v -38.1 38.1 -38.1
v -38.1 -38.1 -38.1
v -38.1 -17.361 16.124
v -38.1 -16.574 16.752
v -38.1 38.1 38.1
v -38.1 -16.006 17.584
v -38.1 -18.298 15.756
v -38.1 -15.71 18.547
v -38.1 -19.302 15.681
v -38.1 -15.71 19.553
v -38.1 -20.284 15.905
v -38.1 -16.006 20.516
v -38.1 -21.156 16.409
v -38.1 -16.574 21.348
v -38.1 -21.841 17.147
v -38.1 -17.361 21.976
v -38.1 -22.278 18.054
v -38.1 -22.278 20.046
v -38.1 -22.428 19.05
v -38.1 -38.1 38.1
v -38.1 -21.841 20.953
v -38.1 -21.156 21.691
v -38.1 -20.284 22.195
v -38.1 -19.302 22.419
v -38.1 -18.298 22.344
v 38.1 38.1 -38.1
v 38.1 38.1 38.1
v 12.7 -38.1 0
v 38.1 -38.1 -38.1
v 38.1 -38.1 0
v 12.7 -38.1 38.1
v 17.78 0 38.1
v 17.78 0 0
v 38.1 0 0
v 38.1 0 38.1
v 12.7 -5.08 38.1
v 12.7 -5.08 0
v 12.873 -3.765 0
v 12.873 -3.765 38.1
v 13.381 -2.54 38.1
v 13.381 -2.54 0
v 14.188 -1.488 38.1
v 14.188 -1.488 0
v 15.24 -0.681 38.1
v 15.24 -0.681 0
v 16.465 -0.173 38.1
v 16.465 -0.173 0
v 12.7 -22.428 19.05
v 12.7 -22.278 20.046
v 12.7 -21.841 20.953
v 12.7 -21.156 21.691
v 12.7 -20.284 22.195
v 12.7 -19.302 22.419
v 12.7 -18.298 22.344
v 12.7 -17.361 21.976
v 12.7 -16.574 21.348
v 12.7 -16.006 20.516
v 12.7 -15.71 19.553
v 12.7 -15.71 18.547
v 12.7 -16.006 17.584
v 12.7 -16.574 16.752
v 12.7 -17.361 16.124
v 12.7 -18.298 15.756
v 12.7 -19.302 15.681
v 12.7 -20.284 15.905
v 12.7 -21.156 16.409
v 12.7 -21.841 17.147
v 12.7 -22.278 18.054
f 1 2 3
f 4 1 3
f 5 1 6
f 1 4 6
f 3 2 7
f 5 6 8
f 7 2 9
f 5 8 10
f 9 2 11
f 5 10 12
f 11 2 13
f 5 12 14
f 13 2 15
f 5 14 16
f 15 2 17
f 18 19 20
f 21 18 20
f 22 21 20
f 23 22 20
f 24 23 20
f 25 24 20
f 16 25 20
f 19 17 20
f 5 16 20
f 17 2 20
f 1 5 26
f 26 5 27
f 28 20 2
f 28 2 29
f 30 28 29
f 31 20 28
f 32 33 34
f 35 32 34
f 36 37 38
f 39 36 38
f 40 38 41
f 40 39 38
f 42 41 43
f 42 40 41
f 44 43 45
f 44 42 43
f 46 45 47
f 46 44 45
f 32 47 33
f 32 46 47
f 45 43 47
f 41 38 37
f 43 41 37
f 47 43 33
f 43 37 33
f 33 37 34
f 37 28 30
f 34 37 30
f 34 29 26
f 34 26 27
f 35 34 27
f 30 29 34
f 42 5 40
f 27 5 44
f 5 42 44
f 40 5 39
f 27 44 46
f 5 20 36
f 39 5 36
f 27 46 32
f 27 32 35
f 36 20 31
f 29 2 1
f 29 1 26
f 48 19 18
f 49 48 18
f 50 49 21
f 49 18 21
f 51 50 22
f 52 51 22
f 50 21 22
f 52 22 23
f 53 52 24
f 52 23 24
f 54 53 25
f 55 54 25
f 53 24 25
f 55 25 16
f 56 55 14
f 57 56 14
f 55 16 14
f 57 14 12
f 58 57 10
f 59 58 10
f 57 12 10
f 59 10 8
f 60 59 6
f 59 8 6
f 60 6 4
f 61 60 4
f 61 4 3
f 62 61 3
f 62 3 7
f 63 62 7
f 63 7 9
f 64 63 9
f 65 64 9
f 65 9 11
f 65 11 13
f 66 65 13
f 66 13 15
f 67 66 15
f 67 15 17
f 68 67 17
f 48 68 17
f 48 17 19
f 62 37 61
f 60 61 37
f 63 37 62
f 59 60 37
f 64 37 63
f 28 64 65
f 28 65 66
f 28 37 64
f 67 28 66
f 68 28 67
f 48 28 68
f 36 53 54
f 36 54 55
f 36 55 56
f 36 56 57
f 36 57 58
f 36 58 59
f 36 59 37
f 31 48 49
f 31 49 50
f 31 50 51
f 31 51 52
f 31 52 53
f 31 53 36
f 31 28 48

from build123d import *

# Parameters (mm, degrees)
F0_W     = 76.2
F0_H     = 76.2
F1_DEPTH = 38.1
F2_W     = 25.4
F2_H     = 38.1
F3_DEPTH = 38.1
F5_D     = 6.7564
F6_R     = 5.08


with BuildPart() as f1:
    # F0 (on Front) → F1 (new body, symmetric)
    with BuildSketch(Plane.XZ):
        Rectangle(F0_W, F0_H)
    extrude(amount=F1_DEPTH, both=True)

    # F2 (on face) → F3 (cut)
    with BuildSketch(Plane.XZ.offset(38.1)):
        with Locations((25.4, 19.05)):
            Rectangle(F2_W, F2_H)
    extrude(amount=-F3_DEPTH, mode=Mode.SUBTRACT)

    # F5 (through all)
    with Locations(Plane.YZ.offset(12.7)):
        with Locations((-19.05, 19.05)):
            Hole(F5_D / 2)

    # F6
    f6_edges = [f1.edges().sort_by_distance(p)[0] for p in [
        (12.7, 0, 19.05),
    ]]
    fillet(f6_edges, radius=F6_R)


solid = f1.part
